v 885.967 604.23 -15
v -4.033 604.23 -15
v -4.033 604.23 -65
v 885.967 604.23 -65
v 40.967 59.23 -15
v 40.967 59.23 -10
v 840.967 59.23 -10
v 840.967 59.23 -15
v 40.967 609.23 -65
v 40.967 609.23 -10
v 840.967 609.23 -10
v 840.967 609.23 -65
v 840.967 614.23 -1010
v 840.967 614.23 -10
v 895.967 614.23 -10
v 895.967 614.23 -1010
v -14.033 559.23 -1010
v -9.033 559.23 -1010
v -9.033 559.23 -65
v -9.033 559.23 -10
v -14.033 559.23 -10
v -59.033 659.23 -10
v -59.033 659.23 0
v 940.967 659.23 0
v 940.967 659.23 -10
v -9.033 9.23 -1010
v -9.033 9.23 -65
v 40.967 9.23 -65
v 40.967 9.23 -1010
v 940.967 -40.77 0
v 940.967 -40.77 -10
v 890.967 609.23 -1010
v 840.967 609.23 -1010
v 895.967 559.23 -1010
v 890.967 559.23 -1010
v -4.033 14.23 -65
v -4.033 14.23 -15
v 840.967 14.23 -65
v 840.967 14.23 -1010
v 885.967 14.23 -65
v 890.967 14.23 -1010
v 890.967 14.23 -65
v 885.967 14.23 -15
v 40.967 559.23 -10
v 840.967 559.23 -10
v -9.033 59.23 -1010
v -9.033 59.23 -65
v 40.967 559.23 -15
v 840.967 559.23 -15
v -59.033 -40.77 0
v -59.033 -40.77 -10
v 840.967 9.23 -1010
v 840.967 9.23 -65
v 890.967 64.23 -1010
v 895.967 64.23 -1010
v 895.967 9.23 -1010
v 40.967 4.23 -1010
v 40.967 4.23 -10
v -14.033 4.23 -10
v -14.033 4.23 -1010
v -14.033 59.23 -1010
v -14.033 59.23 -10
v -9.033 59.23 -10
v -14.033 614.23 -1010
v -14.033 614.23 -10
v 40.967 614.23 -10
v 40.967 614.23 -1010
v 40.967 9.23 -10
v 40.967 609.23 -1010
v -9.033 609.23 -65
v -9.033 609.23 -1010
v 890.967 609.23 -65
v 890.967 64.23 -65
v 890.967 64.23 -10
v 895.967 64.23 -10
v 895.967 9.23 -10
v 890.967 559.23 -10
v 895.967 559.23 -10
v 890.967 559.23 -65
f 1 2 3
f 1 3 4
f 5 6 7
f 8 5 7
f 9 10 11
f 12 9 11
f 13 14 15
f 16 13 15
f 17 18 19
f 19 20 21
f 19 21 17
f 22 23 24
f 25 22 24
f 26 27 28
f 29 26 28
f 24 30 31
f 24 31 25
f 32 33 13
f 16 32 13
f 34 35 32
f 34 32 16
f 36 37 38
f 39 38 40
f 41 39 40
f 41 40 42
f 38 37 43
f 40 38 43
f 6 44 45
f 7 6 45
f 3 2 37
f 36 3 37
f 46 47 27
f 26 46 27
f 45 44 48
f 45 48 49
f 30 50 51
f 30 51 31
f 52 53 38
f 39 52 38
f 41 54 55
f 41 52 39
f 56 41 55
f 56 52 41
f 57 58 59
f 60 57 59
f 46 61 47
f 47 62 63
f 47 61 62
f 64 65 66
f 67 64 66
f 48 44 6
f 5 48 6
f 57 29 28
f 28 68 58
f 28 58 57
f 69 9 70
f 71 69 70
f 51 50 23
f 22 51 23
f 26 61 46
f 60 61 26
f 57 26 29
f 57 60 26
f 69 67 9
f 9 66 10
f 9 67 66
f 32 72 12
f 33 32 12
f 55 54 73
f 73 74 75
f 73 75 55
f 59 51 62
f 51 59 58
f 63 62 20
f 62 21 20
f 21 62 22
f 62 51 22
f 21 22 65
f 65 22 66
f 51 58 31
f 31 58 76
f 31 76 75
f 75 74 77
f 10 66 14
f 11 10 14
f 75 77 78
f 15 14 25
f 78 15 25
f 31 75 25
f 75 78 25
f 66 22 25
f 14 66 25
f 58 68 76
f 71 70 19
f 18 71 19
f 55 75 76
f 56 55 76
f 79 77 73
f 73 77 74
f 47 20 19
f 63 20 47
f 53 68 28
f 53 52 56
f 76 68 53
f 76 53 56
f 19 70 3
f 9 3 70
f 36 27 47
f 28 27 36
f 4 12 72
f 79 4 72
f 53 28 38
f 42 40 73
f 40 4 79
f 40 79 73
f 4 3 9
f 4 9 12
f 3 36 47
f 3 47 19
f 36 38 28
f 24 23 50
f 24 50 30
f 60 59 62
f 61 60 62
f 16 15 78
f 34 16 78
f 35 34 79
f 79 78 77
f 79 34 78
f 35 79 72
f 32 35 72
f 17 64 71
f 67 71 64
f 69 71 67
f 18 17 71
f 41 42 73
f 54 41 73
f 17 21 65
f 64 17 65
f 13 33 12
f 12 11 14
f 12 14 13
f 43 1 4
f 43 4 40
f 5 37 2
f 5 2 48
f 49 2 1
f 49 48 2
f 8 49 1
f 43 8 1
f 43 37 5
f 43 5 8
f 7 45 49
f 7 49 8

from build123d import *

# Parameters (mm, degrees)
F0_W     = 1000
F0_H     = 700
F1_DEPTH = 10
F2_W     = 900
F2_H     = 600
F2_W_2   = 800
F2_H_2   = 500
F3_DEPTH = 5
F4_W     = 900
F4_H     = 600
F4_W_2   = 890
F4_H_2   = 590
F5_DEPTH = 50
F7_DEPTH = 1000


with BuildPart() as f1:
    # F0 (on Top) → F1 (new body)
    with BuildSketch(Plane.XY):
        with Locations((440.967437, 309.230214)):
            Rectangle(F0_W, F0_H)
    extrude(amount=-F1_DEPTH)

    # F2 (on face) → F3 (join)
    with BuildSketch(Plane(origin=(0, 0, -10), x_dir=(1, 0, 0), z_dir=(0, 0, -1))):
        with Locations((440.967437, -309.230214)):
            Rectangle(F2_W, F2_H)
        with Locations((440.967437, -309.230214)):
            Rectangle(F2_W_2, F2_H_2, mode=Mode.SUBTRACT)
    extrude(amount=F3_DEPTH)

    # F4 (on face) → F5 (join)
    with BuildSketch(Plane(origin=(0, 0, -15), x_dir=(1, 0, 0), z_dir=(0, 0, -1))):
        with Locations((440.967437, -309.230214)):
            Rectangle(F4_W, F4_H)
        with Locations((440.967437, -309.230214)):
            Rectangle(F4_W_2, F4_H_2, mode=Mode.SUBTRACT)
    extrude(amount=F5_DEPTH)

    # F6 (on face) → F7 (join)
    with BuildSketch(Plane(origin=(0, 0, -10), x_dir=(1, 0, 0), z_dir=(0, 0, -1))):
        Polygon((-9.032563, -59.230214), (-9.032563, -9.230214), (40.967437, -9.230214), (40.967437, -4.230214), (-14.032563, -4.230214), (-14.032563, -59.230214), align=None)
        Polygon((40.967437, -609.230214), (-9.032563, -609.230214), (-9.032563, -559.230214), (-14.032563, -559.230214), (-14.032563, -614.230214), (40.967437, -614.230214), align=None)
        Polygon((840.967437, -14.230214), (890.967437, -14.230214), (890.967437, -64.230214), (895.967437, -64.230214), (895.967437, -9.230214), (840.967437, -9.230214), align=None)
        Polygon((890.967437, -559.230214), (890.967437, -609.230214), (840.967437, -609.230214), (840.967437, -614.230214), (895.967437, -614.230214), (895.967437, -559.230214), align=None)
    extrude(amount=F7_DEPTH)


solid = f1.part
